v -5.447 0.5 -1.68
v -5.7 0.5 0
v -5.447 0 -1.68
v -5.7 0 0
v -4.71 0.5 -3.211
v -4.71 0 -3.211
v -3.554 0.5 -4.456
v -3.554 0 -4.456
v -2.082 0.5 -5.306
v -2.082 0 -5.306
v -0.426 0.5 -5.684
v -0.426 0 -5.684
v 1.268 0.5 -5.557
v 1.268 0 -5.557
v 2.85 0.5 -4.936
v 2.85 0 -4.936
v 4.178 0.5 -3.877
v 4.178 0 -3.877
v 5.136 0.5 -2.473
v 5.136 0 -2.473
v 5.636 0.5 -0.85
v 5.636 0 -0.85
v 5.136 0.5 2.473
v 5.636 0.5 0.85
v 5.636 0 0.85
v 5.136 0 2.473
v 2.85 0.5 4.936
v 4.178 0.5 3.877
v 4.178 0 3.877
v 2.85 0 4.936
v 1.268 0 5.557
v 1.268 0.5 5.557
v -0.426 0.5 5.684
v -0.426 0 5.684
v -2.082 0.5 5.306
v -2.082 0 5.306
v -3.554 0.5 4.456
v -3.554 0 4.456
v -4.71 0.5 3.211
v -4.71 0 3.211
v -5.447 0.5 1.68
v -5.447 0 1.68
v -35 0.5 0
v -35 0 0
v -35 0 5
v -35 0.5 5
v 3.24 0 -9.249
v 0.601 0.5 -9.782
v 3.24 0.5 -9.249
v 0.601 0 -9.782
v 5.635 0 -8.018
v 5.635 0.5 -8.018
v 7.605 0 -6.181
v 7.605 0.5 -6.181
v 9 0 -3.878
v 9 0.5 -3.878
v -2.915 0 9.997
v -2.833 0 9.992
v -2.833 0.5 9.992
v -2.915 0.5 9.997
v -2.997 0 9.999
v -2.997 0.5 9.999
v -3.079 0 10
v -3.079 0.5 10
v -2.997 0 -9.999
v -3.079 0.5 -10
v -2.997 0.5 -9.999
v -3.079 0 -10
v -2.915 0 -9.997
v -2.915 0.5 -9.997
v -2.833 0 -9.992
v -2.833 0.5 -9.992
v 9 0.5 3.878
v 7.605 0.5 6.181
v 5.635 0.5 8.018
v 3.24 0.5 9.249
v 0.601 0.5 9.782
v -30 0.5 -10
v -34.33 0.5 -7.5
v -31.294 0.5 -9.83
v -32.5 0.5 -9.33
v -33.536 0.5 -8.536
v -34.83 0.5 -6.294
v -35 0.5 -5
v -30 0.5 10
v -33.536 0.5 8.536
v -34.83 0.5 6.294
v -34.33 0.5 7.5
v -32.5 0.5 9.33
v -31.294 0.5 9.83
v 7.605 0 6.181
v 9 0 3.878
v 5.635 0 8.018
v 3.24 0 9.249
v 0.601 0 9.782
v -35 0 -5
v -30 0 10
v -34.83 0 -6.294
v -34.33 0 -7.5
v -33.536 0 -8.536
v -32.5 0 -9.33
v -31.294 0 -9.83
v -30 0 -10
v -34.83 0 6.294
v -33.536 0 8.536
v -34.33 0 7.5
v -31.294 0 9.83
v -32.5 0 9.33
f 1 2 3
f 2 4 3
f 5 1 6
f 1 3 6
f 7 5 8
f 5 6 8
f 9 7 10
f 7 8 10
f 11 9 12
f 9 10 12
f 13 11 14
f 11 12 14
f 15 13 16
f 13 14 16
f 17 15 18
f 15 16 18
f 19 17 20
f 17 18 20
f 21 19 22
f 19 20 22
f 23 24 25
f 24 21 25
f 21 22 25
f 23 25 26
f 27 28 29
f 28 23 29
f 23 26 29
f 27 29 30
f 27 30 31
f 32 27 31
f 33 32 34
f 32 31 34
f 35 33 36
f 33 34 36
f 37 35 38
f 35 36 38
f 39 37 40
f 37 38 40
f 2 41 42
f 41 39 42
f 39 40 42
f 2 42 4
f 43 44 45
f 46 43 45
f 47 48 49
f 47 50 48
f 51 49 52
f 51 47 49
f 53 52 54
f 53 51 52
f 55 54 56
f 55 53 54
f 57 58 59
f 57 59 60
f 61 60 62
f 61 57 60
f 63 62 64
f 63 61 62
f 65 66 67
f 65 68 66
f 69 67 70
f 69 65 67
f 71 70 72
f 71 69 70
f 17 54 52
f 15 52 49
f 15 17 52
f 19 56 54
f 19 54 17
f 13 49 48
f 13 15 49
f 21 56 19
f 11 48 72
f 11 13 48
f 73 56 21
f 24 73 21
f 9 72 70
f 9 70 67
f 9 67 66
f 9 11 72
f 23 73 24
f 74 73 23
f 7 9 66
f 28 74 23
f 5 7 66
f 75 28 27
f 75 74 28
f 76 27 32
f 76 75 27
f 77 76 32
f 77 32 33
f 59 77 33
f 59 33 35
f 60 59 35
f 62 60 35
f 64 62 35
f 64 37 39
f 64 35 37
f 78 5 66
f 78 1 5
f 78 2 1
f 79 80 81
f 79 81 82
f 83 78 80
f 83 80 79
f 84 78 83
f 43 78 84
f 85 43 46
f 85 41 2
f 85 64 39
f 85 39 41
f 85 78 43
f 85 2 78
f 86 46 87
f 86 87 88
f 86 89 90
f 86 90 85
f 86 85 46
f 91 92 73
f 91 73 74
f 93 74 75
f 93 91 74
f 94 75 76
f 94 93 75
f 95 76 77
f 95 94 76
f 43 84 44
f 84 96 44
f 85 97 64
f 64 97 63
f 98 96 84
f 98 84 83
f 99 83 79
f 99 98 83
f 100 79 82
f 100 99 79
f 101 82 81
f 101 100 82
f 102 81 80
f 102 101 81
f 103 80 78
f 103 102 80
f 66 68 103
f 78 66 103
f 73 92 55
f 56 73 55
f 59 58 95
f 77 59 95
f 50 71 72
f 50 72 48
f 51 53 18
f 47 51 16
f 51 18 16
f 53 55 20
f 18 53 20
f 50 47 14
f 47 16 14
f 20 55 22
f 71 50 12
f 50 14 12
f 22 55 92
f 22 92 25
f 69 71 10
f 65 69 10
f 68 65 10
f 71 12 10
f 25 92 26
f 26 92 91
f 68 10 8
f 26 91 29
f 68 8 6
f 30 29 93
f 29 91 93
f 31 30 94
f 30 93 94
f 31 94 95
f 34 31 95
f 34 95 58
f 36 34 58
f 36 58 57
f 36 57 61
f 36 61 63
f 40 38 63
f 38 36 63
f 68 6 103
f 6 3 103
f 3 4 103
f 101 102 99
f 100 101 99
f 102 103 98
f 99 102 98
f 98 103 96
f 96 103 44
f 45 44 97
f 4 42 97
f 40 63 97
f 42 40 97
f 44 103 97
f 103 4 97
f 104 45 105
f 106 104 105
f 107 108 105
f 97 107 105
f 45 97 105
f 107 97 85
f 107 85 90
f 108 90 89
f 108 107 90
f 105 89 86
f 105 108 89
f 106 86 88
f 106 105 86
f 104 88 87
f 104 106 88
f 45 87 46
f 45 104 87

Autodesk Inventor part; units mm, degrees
ref_plane "YZ Plane" through (0, 0, 0) normal (1, 0, 0) x (0, 1, 0)
ref_plane "XZ Plane" through (0, 0, 0) normal (0, 1, 0) x (-1, 0, 0)
ref_plane "XY Plane" through (0, 0, 0) normal (0, 0, 1) x (1, 0, 0)
sketch "Sketch1" plane through (0, 0, 0) normal (0, 1, 0) x (-1, 0, 0)
  circle A0 centre (0, 0) radius 5.7
  arc A1 (0, 9) -> (0, -9) centre (0, 0) ccw construction
  line L0 (0, 9) -> (12.65, 9) construction
  line L1 (12.65, 9) -> (12.65, -9) construction
  line L2 (0, 0) -> (0, -9) construction
  line L3 (3.0786, -10) -> (30, -10)
  line L4 (35, -5) -> (35, 5)
  line L5 (30, 10) -> (3.0786, 10)
  arc A2 (35, 5) -> (30, 10) centre (30, 5) ccw
  arc A3 (30, -10) -> (35, -5) centre (30, -5) ccw
  line L6 (2.8334, -9.9925) -> (-0.6007, -9.7816)
  line L7 (2.8334, 9.9925) -> (-0.6007, 9.7816)
  arc A4 (2.8334, -9.9925) -> (3.0786, -10) centre (3.0786, -6) ccw
  arc A5 (3.0786, 10) -> (2.8334, 9.9925) centre (3.0786, 6) ccw
  line L8 (0, 0) -> (36.2824, 0)
  line L9 (-9, 3.8781) -> (-9, -3.8781)
  arc A6 (-0.6007, 9.7816) -> (-9, 3.8781) centre (0, 0) ccw
  arc A7 (-9, -3.8781) -> (-0.6007, -9.7816) centre (0, 0) ccw
  point P0 (35, -10)
  point P1 (35, 10)
  point P2 (2, -10)
  point P3 (2.9559, 10)
  dimension "d0" = 11.4
  dimension "d1" = 9
  dimension "d2" = 12.65
  dimension "d6" = 5
  dimension "d10" = 20
  dimension "d12" = 4
  dimension "d13" = 20
  dimension "d14" = 20
extrude "Extrusion1" add sketch "Sketch1" along normal blind 0.5
properties part number "Laser-Pivot-Ringpull"
